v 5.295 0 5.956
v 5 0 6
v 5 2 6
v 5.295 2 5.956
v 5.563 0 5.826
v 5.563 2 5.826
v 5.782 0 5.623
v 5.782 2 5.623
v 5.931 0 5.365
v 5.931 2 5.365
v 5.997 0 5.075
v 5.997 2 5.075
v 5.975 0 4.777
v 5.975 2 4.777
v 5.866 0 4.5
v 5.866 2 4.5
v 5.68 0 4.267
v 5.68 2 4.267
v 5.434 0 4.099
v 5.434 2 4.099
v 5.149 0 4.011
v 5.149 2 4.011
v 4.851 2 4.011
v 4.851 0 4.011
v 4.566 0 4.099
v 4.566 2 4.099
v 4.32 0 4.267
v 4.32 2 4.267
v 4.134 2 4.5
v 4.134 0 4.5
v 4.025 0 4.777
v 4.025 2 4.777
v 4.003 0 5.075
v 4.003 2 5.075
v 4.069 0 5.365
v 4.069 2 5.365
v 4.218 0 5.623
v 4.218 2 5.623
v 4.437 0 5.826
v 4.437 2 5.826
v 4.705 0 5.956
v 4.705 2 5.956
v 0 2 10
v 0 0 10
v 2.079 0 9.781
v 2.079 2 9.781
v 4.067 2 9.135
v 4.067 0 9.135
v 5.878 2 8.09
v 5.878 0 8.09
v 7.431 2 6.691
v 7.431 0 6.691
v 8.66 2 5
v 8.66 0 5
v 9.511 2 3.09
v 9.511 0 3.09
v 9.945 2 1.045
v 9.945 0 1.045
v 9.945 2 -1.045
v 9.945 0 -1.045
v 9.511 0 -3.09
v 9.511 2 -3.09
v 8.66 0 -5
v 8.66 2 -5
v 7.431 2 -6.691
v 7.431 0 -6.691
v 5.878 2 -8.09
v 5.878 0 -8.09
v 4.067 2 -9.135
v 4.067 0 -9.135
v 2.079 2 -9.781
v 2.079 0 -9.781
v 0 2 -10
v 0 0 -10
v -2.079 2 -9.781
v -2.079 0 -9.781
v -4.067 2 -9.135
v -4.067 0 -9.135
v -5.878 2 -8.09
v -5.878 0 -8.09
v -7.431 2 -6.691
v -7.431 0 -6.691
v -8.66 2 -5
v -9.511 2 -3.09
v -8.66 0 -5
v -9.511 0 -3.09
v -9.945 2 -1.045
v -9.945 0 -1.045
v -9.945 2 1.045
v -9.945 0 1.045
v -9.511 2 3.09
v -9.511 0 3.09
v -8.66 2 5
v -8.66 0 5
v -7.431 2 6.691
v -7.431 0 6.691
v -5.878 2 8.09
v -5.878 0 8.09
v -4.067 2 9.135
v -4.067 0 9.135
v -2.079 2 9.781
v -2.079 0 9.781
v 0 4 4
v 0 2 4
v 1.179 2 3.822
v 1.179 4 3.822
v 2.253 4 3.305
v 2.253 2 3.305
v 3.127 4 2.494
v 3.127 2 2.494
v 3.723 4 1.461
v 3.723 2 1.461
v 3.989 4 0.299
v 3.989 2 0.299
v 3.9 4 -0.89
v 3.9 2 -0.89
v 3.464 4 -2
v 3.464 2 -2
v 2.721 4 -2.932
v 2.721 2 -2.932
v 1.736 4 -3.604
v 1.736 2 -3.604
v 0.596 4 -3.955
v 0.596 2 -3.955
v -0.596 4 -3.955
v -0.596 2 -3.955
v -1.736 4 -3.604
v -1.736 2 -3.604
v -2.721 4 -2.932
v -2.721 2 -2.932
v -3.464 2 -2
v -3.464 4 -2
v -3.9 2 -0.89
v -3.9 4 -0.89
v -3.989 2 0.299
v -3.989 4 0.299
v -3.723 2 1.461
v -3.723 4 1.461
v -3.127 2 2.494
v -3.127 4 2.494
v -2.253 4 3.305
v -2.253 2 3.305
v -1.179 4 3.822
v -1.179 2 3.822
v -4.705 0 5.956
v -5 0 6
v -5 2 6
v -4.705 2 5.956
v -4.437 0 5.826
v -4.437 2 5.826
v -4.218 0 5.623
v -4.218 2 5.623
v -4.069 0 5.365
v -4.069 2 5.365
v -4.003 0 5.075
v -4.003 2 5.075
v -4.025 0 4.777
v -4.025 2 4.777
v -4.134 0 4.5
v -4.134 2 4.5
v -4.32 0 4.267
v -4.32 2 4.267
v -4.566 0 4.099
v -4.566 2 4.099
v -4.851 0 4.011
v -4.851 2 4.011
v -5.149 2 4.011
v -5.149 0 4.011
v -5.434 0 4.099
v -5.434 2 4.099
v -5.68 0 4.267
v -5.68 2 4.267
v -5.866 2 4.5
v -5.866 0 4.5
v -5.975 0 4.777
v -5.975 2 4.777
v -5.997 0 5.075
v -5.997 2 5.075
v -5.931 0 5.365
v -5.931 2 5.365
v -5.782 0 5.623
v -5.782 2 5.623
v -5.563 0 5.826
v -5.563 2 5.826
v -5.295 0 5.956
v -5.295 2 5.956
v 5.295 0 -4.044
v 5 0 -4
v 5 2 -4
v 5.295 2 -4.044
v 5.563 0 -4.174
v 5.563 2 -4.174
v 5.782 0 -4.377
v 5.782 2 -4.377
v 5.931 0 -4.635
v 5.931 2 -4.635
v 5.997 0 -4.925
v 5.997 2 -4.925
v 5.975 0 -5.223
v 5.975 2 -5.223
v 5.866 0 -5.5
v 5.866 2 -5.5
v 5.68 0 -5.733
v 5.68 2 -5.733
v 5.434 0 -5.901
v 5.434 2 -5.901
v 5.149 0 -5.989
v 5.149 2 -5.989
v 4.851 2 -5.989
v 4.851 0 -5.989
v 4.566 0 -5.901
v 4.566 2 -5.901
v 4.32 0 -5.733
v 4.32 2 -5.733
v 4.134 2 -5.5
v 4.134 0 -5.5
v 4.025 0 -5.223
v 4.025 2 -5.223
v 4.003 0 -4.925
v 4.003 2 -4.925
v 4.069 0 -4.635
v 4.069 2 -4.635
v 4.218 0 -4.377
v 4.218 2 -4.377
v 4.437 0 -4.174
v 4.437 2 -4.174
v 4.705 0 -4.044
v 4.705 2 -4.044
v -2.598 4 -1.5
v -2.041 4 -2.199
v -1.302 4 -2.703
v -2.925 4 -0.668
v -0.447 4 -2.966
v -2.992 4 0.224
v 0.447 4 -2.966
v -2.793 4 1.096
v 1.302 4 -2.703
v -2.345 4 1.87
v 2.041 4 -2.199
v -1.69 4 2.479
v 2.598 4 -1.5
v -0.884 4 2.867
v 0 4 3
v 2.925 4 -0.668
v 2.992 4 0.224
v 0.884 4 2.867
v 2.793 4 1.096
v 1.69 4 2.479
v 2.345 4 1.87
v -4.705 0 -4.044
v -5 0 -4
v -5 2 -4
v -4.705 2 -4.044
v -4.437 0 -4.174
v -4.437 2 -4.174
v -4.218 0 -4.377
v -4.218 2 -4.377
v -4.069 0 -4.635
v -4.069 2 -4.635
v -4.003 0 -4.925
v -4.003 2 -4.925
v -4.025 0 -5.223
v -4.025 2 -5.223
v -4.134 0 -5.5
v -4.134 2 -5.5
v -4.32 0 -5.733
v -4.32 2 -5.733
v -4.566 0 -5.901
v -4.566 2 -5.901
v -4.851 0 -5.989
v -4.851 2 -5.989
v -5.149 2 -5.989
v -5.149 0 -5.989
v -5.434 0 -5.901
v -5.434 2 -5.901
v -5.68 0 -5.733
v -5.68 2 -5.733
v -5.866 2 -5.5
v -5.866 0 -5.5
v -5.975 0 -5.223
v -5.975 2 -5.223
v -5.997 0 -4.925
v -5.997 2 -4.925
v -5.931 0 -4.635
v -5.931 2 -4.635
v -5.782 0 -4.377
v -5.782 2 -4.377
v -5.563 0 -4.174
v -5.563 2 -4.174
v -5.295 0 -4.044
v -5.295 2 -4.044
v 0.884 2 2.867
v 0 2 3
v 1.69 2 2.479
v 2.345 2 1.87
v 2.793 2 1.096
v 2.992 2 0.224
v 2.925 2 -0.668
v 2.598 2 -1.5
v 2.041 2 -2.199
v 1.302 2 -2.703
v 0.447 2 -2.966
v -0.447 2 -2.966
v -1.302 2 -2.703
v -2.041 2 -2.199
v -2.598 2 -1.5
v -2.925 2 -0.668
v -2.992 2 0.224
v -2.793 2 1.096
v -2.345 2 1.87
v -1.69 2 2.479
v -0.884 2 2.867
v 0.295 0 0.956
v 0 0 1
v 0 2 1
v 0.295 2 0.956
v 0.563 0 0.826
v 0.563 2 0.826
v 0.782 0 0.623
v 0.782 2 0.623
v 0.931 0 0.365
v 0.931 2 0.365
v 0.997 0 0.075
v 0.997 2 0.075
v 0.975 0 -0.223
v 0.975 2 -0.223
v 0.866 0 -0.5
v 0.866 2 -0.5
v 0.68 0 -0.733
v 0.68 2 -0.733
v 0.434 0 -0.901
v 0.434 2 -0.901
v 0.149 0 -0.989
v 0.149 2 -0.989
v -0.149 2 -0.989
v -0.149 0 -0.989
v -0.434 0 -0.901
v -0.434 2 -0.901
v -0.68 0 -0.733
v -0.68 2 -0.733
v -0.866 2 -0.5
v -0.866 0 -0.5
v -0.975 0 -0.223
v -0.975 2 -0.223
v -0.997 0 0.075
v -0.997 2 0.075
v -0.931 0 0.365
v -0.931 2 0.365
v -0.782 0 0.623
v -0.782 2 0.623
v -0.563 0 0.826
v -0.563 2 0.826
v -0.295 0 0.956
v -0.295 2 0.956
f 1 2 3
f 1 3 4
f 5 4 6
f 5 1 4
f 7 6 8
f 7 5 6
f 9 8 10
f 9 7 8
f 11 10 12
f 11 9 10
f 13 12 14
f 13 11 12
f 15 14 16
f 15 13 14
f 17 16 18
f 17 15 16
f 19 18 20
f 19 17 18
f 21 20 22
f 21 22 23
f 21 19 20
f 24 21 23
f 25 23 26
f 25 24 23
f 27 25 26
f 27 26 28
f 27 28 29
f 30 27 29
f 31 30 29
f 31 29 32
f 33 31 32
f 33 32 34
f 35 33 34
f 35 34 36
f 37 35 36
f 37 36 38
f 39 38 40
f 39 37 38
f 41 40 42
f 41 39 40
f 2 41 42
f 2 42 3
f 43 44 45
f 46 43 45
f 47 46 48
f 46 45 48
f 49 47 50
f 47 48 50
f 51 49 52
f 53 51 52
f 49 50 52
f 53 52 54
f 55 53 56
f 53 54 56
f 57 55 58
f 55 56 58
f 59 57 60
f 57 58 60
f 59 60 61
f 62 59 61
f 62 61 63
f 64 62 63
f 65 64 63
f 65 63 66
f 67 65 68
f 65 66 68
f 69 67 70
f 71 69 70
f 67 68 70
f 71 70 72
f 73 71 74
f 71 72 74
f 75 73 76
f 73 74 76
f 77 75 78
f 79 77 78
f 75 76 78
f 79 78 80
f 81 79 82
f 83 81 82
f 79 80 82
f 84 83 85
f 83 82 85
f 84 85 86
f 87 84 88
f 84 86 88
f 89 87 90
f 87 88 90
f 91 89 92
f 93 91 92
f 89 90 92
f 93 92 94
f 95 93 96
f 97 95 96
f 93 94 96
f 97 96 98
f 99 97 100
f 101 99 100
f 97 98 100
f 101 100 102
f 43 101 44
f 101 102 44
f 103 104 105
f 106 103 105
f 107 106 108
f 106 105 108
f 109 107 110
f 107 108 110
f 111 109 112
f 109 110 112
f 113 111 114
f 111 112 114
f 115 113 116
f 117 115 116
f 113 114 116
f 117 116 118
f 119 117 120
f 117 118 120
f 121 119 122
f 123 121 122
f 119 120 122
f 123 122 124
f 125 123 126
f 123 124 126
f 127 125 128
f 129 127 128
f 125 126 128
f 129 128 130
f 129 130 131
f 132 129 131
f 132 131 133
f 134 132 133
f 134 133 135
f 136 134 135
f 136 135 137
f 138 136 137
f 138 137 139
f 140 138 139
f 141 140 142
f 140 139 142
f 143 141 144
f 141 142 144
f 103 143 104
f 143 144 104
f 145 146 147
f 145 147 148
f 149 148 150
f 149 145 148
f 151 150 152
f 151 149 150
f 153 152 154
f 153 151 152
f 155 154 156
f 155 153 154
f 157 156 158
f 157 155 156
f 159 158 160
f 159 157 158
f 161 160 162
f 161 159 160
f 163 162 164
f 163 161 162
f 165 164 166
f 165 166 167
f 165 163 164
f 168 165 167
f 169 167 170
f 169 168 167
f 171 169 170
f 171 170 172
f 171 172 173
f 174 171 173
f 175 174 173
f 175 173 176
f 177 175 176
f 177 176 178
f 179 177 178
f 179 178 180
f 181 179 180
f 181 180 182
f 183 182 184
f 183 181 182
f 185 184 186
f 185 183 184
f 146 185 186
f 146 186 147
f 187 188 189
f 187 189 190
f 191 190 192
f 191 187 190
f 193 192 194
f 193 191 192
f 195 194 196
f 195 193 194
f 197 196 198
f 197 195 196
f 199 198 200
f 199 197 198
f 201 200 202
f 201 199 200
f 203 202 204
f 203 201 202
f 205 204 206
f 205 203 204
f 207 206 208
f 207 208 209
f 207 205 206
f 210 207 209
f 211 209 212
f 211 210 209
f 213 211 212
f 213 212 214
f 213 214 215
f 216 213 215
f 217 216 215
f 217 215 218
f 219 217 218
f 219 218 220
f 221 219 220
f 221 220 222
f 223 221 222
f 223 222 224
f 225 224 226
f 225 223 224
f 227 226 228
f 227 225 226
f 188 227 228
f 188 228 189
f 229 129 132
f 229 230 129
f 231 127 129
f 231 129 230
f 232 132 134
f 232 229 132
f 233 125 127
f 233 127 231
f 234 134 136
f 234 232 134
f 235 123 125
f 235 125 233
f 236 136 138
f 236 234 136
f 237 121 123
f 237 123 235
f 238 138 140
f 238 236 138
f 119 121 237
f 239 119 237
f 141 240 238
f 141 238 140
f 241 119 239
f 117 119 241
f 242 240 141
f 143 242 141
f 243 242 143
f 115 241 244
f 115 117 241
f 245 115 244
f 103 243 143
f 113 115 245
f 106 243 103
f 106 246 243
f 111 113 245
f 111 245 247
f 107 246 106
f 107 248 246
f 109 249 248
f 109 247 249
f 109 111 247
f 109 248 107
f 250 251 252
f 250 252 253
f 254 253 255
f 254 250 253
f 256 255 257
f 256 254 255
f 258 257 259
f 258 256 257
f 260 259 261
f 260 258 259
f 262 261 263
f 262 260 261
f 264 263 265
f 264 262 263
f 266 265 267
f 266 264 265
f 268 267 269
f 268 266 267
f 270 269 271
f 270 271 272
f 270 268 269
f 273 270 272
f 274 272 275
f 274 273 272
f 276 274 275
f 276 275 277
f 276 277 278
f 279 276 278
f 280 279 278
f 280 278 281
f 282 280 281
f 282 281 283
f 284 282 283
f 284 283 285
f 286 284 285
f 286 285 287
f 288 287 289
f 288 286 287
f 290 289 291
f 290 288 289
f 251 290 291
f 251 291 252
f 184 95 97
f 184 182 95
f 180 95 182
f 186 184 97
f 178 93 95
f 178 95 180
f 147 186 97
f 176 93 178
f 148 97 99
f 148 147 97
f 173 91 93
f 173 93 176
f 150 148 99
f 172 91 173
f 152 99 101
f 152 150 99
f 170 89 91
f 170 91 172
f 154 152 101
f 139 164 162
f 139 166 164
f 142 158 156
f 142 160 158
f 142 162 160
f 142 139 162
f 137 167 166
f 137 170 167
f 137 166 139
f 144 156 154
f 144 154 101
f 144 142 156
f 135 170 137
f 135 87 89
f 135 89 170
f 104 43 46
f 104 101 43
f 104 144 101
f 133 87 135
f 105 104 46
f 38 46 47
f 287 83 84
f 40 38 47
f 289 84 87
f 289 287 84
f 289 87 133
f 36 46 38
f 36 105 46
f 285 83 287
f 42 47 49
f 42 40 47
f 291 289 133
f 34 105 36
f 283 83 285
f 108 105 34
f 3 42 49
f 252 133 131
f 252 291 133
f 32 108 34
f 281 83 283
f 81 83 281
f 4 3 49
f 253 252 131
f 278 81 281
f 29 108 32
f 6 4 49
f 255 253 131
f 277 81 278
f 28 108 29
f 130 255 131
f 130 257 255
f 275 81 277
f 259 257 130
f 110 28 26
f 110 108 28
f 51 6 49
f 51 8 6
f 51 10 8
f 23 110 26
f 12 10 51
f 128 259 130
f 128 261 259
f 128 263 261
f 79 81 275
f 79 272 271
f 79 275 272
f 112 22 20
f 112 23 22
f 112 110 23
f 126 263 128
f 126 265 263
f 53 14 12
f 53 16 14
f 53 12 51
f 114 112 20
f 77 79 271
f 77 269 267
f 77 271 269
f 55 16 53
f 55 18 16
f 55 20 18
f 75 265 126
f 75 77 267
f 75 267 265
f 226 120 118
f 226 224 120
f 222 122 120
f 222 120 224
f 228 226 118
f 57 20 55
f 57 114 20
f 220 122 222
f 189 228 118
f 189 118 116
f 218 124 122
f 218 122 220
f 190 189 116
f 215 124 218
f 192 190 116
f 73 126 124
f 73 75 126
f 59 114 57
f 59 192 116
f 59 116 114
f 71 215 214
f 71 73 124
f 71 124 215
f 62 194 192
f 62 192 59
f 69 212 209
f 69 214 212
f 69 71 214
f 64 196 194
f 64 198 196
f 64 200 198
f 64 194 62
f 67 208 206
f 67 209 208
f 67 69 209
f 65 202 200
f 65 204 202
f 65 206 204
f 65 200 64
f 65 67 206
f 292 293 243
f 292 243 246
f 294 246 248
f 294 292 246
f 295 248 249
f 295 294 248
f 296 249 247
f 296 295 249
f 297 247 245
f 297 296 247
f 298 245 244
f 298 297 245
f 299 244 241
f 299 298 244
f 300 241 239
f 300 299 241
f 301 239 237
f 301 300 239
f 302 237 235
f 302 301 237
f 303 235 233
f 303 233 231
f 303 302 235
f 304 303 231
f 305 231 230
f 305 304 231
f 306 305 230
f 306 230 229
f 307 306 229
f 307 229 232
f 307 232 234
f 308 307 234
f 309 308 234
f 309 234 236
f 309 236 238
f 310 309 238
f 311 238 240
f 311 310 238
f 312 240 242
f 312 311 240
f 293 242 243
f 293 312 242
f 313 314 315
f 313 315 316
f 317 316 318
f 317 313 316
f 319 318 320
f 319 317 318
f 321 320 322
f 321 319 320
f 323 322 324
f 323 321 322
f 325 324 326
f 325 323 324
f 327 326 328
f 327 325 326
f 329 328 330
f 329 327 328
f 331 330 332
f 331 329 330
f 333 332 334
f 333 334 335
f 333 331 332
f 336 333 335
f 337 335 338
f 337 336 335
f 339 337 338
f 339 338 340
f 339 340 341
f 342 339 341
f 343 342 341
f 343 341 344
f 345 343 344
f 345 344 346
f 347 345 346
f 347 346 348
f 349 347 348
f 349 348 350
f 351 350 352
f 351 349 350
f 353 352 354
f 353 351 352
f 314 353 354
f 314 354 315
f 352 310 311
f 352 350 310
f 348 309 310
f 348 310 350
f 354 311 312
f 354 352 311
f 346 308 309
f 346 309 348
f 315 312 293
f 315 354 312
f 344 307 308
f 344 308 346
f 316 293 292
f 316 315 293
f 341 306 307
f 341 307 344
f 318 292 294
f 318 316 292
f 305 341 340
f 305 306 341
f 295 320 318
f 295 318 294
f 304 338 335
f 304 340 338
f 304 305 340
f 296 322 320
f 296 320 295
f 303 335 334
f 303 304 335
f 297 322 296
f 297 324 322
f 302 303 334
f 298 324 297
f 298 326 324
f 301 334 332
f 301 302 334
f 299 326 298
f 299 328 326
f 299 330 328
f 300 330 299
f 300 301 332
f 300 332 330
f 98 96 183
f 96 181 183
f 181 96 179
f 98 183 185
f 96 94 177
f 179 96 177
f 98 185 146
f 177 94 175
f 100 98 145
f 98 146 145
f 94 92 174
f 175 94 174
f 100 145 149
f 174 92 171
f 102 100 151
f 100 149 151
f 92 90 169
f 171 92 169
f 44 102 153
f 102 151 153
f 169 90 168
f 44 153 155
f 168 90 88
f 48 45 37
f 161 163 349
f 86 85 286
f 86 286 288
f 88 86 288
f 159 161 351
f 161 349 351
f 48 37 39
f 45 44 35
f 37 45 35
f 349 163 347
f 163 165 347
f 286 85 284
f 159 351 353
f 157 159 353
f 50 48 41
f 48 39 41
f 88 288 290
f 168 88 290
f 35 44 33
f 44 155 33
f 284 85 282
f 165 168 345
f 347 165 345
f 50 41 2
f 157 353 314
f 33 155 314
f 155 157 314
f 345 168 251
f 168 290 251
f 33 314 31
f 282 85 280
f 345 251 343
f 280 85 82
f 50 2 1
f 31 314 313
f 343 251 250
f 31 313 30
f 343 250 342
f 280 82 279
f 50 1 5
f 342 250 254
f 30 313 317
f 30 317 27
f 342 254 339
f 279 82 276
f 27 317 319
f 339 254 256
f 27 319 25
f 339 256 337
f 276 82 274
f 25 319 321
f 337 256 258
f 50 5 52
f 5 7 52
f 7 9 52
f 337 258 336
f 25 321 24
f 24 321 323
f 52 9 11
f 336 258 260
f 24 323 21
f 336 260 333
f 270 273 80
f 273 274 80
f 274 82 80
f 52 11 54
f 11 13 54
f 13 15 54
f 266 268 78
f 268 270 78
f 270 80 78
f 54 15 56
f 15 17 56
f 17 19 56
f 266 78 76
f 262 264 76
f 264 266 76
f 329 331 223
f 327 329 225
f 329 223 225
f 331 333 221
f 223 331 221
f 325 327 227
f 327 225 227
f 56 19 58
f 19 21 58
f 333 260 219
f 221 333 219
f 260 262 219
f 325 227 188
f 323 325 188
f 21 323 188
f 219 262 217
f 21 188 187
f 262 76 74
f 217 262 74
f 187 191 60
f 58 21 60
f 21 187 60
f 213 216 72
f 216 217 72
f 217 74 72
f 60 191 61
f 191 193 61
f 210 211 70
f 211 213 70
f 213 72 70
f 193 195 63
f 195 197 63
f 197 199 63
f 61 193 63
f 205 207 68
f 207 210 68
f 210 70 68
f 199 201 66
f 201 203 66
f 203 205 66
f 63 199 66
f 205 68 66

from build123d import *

# Parameters (mm, degrees)
SKETCH_1_R      = 10
SKETCH_1_R_2    = 1
SKETCH_1_R_3    = 3.083795415
EXTRUDE_1_DEPTH = 2
SKETCH_2_R      = 4
SKETCH_2_R_2    = 3
EXTRUDE_2_DEPTH = 2


with BuildPart() as part:
    # 草图1 → 凸台-拉伸1 (new body)
    # profile 1 of 2: a face of its own
    with BuildSketch(Plane(origin=(0, 0, 0), x_dir=(1, 0, 0), z_dir=(0, 1, 0))):
        with Locations(Location((0, 0, 0), (0, 0, 270))):
            Circle(SKETCH_1_R)
        with Locations(Location((-5, -5, 0), (0, 0, 270))):
            Circle(SKETCH_1_R_2, mode=Mode.SUBTRACT)
        with Locations(Location((5, -5, 0), (0, 0, 270))):
            Circle(SKETCH_1_R_2, mode=Mode.SUBTRACT)
        with Locations(Location((5, 5, 0), (0, 0, 270))):
            Circle(SKETCH_1_R_2, mode=Mode.SUBTRACT)
        with Locations(Location((-5, 5, 0), (0, 0, 270))):
            Circle(SKETCH_1_R_2, mode=Mode.SUBTRACT)
        Circle(SKETCH_1_R_3, mode=Mode.SUBTRACT)
    # profile 2 of 2: a face of its own
    with BuildSketch(Plane(origin=(0, 0, 0), x_dir=(1, 0, 0), z_dir=(0, 1, 0))):
        Circle(SKETCH_1_R_3)
        with Locations(Location((0, 0, 0), (0, 0, 270))):
            Circle(SKETCH_1_R_2, mode=Mode.SUBTRACT)
    extrude(amount=EXTRUDE_1_DEPTH)

    # 草图2 → 凸台-拉伸2 (add)
    with BuildSketch(Plane(origin=(0, 2, 0), x_dir=(1, 0, 0), z_dir=(0, 1, 0))):
        with Locations(Location((0, 0, 0), (0, 0, 270))):
            Circle(SKETCH_2_R)
        with Locations(Location((0, 0, 0), (0, 0, 270))):
            Circle(SKETCH_2_R_2, mode=Mode.SUBTRACT)
    extrude(amount=EXTRUDE_2_DEPTH)


solid = part.part
